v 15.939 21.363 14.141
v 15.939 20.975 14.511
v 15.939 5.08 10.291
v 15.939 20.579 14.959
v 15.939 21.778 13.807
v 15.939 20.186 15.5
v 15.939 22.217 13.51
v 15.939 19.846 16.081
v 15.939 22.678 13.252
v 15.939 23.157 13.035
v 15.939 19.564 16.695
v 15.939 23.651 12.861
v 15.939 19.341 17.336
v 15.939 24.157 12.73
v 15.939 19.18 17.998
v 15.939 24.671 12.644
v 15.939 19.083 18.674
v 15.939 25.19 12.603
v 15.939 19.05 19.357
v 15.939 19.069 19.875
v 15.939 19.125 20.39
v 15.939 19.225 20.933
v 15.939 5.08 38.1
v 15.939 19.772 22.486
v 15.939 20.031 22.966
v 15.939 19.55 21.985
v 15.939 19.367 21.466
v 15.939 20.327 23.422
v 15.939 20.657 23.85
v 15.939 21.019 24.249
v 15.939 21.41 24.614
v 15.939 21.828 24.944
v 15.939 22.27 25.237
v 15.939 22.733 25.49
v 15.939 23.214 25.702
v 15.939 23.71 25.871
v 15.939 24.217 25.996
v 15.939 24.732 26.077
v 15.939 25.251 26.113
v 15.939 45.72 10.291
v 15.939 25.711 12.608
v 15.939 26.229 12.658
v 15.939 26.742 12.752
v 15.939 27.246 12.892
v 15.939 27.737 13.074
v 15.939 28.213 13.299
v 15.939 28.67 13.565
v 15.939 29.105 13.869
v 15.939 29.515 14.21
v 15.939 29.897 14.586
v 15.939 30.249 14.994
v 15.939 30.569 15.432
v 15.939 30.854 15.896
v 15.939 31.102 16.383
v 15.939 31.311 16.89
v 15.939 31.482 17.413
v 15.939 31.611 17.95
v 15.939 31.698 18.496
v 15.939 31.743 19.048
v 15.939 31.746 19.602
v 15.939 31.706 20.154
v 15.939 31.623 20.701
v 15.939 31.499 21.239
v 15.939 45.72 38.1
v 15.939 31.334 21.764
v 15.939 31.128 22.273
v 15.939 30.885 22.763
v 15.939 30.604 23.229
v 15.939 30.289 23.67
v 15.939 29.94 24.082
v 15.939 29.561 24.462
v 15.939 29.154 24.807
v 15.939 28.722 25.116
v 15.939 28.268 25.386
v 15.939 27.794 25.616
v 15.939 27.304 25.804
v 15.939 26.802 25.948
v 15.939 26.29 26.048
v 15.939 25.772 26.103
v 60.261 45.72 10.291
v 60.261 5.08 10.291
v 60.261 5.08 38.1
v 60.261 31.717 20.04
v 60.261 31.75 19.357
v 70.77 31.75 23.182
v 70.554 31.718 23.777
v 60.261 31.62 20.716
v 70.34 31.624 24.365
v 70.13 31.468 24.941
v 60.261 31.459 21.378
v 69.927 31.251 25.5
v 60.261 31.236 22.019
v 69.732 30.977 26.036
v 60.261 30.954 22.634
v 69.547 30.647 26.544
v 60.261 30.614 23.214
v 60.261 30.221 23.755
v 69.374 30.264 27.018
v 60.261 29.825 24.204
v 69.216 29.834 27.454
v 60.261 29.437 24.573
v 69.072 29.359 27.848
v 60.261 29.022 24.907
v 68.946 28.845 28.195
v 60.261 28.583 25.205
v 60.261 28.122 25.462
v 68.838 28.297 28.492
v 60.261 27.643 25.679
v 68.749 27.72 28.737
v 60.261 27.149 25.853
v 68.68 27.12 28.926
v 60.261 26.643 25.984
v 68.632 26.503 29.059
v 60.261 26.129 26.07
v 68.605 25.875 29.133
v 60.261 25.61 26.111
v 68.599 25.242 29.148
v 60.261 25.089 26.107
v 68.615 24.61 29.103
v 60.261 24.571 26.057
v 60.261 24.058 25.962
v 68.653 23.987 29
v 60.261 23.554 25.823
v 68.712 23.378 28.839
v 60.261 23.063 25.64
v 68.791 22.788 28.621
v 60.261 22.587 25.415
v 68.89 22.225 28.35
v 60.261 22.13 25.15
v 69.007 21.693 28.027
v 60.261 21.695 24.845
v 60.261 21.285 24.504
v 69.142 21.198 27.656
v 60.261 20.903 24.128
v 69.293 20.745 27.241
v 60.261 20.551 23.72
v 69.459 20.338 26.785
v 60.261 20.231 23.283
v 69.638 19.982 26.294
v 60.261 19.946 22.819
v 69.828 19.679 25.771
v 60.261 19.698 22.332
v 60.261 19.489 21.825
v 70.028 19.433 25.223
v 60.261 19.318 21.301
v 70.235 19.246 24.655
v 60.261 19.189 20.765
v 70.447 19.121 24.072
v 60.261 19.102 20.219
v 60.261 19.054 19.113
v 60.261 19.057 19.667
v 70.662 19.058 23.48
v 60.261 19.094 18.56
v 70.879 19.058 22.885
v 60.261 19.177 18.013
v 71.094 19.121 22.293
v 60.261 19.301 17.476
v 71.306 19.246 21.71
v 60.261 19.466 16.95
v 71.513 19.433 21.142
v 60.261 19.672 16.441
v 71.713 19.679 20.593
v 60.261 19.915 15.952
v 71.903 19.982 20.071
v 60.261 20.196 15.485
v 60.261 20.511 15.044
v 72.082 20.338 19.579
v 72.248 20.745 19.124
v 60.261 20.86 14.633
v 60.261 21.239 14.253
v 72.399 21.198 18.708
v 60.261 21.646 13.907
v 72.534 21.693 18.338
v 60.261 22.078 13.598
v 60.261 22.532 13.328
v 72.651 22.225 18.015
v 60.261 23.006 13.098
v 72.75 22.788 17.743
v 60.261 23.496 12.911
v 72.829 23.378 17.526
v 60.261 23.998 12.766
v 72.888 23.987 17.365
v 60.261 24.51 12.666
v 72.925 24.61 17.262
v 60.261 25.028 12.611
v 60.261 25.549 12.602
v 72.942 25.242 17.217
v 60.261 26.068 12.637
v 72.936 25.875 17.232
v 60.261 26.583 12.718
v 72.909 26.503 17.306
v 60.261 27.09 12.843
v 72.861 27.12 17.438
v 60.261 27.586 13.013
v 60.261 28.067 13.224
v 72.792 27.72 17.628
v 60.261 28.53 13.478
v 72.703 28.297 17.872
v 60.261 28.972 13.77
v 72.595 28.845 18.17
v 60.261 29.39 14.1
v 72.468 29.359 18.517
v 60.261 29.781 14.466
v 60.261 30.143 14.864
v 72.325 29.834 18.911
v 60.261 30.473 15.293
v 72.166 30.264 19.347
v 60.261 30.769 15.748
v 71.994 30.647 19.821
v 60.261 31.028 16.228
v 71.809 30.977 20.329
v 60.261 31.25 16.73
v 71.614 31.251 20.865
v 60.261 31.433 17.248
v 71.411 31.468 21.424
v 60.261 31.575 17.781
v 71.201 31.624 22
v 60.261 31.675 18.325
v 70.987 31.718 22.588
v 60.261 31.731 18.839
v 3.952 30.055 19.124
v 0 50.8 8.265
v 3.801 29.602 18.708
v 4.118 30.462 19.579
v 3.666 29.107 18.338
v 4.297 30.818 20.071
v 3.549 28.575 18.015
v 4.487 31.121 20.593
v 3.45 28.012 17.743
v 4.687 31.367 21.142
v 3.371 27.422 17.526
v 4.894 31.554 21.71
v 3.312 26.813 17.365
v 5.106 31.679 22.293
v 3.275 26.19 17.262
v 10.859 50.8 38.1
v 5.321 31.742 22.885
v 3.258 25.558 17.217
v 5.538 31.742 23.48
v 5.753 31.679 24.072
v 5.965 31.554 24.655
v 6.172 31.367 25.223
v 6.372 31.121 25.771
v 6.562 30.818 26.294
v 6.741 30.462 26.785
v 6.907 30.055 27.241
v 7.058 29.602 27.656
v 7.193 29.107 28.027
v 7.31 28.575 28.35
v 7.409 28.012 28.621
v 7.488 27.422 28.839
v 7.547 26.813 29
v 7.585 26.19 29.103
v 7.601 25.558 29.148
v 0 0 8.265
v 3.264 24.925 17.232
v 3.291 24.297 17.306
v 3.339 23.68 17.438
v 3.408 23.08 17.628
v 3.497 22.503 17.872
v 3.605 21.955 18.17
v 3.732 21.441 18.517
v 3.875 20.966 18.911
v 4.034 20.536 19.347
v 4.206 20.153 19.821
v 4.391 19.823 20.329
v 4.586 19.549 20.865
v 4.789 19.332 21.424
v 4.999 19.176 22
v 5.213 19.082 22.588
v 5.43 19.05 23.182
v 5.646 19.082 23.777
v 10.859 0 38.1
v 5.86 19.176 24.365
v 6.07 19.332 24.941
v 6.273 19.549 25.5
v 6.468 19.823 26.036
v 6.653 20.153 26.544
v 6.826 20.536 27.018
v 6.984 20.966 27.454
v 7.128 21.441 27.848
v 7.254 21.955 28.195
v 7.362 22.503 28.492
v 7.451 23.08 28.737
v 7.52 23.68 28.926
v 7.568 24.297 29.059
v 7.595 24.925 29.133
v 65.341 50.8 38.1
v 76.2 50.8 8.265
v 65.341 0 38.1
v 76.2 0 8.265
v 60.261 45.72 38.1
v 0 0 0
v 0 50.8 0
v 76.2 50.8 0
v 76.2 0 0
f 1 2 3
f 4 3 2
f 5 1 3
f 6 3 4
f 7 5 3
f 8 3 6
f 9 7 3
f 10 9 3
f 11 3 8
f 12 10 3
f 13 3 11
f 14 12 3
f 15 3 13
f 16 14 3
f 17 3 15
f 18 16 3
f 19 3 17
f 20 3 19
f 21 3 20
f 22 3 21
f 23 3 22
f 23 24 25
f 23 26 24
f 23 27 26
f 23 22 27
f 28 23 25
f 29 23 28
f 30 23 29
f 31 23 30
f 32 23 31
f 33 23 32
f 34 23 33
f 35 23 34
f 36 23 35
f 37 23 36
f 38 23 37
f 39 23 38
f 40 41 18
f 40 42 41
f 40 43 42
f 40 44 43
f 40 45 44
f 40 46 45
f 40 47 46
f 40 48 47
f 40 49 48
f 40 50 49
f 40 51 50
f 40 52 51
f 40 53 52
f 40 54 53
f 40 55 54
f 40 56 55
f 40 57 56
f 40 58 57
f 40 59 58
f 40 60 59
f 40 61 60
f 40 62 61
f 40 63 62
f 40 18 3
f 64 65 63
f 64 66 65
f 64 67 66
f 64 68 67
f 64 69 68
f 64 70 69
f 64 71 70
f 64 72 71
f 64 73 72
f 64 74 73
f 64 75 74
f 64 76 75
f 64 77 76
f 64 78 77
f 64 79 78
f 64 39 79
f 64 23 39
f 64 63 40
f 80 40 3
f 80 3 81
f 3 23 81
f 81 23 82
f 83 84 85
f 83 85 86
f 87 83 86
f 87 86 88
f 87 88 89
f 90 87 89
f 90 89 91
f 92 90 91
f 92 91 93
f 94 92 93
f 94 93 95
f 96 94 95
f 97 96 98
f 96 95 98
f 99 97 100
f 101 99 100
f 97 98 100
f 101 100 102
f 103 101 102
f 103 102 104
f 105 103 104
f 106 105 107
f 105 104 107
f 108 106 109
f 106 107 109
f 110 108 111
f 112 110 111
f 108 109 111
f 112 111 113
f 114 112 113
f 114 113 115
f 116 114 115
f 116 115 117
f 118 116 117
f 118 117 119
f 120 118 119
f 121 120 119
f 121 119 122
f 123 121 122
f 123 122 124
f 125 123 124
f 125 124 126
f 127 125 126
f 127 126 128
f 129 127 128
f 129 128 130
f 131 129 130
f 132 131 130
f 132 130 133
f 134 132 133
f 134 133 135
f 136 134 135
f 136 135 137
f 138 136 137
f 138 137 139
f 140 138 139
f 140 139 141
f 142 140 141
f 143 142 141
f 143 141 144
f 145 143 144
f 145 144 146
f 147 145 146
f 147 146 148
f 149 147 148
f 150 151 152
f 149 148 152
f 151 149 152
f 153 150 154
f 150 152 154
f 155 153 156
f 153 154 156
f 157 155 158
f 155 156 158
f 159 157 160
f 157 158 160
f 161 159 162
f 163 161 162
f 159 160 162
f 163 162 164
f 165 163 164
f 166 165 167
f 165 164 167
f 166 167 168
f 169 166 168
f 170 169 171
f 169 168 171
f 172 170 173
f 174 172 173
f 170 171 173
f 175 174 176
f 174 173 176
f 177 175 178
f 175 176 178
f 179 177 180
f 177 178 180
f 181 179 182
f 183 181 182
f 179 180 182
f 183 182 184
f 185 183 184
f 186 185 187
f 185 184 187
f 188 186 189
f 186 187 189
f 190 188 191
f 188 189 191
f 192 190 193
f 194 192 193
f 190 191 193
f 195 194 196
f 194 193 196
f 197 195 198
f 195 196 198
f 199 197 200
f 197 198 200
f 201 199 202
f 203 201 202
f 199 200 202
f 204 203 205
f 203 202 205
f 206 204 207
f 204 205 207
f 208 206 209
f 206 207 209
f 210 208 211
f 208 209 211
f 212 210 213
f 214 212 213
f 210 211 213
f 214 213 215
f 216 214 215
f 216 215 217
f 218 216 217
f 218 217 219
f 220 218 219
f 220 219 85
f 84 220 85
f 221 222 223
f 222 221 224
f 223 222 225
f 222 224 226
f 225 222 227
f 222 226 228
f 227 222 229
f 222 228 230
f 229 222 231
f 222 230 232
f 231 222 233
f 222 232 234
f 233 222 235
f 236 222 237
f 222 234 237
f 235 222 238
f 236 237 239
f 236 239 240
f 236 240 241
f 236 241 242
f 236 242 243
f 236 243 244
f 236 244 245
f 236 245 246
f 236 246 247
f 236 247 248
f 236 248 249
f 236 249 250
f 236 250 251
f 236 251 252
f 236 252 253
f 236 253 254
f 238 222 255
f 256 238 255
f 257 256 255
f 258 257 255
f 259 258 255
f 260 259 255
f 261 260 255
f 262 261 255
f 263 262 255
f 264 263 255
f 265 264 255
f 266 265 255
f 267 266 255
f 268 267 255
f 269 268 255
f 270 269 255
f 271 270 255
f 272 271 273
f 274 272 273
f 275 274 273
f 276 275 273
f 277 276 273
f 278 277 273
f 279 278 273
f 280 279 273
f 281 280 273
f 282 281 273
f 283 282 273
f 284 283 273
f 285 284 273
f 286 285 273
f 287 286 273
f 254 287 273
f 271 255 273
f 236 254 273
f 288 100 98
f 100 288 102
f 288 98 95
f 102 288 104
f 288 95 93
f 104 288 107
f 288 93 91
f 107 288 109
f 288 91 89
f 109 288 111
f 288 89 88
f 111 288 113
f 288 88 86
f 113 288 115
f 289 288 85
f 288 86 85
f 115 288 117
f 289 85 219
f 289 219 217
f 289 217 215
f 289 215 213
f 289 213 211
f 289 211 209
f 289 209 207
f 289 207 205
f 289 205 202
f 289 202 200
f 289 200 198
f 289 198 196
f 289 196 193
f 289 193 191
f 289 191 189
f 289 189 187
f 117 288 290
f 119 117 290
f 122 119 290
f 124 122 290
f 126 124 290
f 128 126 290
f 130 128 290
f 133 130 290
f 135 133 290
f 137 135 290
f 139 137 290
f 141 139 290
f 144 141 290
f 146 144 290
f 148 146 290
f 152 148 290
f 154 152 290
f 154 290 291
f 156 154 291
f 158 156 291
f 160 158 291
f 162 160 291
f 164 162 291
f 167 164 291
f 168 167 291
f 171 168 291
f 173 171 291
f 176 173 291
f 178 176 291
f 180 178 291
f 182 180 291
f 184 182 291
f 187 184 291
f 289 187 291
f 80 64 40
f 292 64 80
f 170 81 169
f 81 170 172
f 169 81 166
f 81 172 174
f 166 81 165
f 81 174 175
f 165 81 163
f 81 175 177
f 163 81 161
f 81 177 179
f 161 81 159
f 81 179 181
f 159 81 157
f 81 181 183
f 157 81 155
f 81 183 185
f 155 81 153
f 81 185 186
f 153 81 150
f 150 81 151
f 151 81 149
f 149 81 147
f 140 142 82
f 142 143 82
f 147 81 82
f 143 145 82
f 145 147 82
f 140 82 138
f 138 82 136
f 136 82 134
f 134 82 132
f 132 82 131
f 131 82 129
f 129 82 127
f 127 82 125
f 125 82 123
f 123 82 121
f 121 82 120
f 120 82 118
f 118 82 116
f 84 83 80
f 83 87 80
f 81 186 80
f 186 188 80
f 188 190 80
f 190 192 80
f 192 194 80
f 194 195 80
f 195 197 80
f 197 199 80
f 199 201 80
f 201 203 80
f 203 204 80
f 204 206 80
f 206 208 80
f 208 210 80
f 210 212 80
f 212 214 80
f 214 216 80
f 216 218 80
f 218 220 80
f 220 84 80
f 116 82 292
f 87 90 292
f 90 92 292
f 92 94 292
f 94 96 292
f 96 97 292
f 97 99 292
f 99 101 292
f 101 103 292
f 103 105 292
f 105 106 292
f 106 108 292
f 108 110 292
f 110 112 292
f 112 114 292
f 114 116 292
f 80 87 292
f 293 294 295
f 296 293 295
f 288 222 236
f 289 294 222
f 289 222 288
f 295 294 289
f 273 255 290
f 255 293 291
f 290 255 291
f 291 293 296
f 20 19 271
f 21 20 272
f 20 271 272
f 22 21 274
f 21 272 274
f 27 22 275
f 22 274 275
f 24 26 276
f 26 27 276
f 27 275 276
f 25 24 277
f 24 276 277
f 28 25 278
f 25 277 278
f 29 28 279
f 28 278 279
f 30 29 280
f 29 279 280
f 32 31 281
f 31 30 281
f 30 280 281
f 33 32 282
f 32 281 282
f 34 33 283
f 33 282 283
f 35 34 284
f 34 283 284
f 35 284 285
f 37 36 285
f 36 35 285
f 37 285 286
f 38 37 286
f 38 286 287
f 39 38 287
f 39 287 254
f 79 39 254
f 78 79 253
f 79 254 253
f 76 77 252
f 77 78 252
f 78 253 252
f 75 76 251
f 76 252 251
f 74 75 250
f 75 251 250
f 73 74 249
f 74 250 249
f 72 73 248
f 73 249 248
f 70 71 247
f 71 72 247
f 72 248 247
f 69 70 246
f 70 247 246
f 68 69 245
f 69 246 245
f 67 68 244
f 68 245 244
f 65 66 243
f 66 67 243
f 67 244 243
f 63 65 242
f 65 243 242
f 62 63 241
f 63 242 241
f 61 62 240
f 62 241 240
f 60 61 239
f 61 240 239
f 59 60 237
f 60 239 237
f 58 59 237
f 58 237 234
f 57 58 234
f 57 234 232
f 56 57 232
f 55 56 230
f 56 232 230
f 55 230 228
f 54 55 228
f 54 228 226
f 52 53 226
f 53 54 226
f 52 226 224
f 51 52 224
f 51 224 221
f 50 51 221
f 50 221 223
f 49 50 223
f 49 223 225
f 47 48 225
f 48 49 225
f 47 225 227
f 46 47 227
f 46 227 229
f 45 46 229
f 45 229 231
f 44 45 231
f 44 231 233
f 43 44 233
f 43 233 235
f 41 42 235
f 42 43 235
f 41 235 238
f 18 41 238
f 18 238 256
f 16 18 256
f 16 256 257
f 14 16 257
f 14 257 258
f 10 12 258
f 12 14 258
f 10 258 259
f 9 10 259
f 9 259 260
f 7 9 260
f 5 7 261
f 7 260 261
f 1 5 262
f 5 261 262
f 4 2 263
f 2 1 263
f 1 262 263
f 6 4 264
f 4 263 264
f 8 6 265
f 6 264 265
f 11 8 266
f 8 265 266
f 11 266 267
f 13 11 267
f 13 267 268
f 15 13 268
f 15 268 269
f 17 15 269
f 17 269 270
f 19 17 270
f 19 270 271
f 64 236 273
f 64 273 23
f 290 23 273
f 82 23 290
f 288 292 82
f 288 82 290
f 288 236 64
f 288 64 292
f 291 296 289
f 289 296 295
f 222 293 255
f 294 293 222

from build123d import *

# Parameters (mm, degrees)
F0_W     = 76.2
F0_H     = 50.8
F1_DEPTH = 38.1
F3_DEPTH = 50.8
F4_W     = 44.3217208988
F4_H     = 40.64
F5_DEPTH = 27.8086844974
F6_R     = 6.35
F7_DEPTH = 13.4962615407
F8_R     = 6.35
F9_DEPTH = 13.4962615407


with BuildPart() as f1:
    # F0 (on Top) → F1 (new body)
    with BuildSketch(Plane.XY):
        with Locations((38.1, 25.4)):
            Rectangle(F0_W, F0_H)
    extrude(amount=F1_DEPTH)

    # F2 (on face) → F3 (cut, through all)
    with BuildSketch(Plane.XZ):
        Polygon((0, 38.1), (0, 8.26475929), (10.8591395506, 38.1), align=None)
        Polygon((76.2, 38.1), (65.3408604494, 38.1), (76.2, 8.26475929), align=None)
    extrude(amount=-F3_DEPTH, mode=Mode.SUBTRACT)

    # F4 (on face) → F5 (cut, through all)
    with BuildSketch(Plane.XY.offset(38.1)):
        with Locations((38.1, 25.4)):
            Rectangle(F4_W, F4_H)
    extrude(amount=-F5_DEPTH, mode=Mode.SUBTRACT)

    # F6 (on face) → F7 (cut, through all)
    with BuildSketch(Plane(origin=(-2.6562424343, 0, 0.9667931811), x_dir=(0, -1, 0), z_dir=(-0.9396926208, 0, 0.3420201433))):
        with Locations((-25.4, 23.6413333174)):
            Circle(F6_R)
    extrude(amount=-F7_DEPTH, mode=Mode.SUBTRACT)

    # F8 (on face) → F9 (cut, through all)
    with BuildSketch(Plane(origin=(69.9425357172, 0, 25.4570011102), x_dir=(0, 1, 0), z_dir=(0.9396926208, 0, 0.3420201433))):
        with Locations((25.4, -2.420601604)):
            Circle(F8_R)
    extrude(amount=-F9_DEPTH, mode=Mode.SUBTRACT)


solid = f1.part
